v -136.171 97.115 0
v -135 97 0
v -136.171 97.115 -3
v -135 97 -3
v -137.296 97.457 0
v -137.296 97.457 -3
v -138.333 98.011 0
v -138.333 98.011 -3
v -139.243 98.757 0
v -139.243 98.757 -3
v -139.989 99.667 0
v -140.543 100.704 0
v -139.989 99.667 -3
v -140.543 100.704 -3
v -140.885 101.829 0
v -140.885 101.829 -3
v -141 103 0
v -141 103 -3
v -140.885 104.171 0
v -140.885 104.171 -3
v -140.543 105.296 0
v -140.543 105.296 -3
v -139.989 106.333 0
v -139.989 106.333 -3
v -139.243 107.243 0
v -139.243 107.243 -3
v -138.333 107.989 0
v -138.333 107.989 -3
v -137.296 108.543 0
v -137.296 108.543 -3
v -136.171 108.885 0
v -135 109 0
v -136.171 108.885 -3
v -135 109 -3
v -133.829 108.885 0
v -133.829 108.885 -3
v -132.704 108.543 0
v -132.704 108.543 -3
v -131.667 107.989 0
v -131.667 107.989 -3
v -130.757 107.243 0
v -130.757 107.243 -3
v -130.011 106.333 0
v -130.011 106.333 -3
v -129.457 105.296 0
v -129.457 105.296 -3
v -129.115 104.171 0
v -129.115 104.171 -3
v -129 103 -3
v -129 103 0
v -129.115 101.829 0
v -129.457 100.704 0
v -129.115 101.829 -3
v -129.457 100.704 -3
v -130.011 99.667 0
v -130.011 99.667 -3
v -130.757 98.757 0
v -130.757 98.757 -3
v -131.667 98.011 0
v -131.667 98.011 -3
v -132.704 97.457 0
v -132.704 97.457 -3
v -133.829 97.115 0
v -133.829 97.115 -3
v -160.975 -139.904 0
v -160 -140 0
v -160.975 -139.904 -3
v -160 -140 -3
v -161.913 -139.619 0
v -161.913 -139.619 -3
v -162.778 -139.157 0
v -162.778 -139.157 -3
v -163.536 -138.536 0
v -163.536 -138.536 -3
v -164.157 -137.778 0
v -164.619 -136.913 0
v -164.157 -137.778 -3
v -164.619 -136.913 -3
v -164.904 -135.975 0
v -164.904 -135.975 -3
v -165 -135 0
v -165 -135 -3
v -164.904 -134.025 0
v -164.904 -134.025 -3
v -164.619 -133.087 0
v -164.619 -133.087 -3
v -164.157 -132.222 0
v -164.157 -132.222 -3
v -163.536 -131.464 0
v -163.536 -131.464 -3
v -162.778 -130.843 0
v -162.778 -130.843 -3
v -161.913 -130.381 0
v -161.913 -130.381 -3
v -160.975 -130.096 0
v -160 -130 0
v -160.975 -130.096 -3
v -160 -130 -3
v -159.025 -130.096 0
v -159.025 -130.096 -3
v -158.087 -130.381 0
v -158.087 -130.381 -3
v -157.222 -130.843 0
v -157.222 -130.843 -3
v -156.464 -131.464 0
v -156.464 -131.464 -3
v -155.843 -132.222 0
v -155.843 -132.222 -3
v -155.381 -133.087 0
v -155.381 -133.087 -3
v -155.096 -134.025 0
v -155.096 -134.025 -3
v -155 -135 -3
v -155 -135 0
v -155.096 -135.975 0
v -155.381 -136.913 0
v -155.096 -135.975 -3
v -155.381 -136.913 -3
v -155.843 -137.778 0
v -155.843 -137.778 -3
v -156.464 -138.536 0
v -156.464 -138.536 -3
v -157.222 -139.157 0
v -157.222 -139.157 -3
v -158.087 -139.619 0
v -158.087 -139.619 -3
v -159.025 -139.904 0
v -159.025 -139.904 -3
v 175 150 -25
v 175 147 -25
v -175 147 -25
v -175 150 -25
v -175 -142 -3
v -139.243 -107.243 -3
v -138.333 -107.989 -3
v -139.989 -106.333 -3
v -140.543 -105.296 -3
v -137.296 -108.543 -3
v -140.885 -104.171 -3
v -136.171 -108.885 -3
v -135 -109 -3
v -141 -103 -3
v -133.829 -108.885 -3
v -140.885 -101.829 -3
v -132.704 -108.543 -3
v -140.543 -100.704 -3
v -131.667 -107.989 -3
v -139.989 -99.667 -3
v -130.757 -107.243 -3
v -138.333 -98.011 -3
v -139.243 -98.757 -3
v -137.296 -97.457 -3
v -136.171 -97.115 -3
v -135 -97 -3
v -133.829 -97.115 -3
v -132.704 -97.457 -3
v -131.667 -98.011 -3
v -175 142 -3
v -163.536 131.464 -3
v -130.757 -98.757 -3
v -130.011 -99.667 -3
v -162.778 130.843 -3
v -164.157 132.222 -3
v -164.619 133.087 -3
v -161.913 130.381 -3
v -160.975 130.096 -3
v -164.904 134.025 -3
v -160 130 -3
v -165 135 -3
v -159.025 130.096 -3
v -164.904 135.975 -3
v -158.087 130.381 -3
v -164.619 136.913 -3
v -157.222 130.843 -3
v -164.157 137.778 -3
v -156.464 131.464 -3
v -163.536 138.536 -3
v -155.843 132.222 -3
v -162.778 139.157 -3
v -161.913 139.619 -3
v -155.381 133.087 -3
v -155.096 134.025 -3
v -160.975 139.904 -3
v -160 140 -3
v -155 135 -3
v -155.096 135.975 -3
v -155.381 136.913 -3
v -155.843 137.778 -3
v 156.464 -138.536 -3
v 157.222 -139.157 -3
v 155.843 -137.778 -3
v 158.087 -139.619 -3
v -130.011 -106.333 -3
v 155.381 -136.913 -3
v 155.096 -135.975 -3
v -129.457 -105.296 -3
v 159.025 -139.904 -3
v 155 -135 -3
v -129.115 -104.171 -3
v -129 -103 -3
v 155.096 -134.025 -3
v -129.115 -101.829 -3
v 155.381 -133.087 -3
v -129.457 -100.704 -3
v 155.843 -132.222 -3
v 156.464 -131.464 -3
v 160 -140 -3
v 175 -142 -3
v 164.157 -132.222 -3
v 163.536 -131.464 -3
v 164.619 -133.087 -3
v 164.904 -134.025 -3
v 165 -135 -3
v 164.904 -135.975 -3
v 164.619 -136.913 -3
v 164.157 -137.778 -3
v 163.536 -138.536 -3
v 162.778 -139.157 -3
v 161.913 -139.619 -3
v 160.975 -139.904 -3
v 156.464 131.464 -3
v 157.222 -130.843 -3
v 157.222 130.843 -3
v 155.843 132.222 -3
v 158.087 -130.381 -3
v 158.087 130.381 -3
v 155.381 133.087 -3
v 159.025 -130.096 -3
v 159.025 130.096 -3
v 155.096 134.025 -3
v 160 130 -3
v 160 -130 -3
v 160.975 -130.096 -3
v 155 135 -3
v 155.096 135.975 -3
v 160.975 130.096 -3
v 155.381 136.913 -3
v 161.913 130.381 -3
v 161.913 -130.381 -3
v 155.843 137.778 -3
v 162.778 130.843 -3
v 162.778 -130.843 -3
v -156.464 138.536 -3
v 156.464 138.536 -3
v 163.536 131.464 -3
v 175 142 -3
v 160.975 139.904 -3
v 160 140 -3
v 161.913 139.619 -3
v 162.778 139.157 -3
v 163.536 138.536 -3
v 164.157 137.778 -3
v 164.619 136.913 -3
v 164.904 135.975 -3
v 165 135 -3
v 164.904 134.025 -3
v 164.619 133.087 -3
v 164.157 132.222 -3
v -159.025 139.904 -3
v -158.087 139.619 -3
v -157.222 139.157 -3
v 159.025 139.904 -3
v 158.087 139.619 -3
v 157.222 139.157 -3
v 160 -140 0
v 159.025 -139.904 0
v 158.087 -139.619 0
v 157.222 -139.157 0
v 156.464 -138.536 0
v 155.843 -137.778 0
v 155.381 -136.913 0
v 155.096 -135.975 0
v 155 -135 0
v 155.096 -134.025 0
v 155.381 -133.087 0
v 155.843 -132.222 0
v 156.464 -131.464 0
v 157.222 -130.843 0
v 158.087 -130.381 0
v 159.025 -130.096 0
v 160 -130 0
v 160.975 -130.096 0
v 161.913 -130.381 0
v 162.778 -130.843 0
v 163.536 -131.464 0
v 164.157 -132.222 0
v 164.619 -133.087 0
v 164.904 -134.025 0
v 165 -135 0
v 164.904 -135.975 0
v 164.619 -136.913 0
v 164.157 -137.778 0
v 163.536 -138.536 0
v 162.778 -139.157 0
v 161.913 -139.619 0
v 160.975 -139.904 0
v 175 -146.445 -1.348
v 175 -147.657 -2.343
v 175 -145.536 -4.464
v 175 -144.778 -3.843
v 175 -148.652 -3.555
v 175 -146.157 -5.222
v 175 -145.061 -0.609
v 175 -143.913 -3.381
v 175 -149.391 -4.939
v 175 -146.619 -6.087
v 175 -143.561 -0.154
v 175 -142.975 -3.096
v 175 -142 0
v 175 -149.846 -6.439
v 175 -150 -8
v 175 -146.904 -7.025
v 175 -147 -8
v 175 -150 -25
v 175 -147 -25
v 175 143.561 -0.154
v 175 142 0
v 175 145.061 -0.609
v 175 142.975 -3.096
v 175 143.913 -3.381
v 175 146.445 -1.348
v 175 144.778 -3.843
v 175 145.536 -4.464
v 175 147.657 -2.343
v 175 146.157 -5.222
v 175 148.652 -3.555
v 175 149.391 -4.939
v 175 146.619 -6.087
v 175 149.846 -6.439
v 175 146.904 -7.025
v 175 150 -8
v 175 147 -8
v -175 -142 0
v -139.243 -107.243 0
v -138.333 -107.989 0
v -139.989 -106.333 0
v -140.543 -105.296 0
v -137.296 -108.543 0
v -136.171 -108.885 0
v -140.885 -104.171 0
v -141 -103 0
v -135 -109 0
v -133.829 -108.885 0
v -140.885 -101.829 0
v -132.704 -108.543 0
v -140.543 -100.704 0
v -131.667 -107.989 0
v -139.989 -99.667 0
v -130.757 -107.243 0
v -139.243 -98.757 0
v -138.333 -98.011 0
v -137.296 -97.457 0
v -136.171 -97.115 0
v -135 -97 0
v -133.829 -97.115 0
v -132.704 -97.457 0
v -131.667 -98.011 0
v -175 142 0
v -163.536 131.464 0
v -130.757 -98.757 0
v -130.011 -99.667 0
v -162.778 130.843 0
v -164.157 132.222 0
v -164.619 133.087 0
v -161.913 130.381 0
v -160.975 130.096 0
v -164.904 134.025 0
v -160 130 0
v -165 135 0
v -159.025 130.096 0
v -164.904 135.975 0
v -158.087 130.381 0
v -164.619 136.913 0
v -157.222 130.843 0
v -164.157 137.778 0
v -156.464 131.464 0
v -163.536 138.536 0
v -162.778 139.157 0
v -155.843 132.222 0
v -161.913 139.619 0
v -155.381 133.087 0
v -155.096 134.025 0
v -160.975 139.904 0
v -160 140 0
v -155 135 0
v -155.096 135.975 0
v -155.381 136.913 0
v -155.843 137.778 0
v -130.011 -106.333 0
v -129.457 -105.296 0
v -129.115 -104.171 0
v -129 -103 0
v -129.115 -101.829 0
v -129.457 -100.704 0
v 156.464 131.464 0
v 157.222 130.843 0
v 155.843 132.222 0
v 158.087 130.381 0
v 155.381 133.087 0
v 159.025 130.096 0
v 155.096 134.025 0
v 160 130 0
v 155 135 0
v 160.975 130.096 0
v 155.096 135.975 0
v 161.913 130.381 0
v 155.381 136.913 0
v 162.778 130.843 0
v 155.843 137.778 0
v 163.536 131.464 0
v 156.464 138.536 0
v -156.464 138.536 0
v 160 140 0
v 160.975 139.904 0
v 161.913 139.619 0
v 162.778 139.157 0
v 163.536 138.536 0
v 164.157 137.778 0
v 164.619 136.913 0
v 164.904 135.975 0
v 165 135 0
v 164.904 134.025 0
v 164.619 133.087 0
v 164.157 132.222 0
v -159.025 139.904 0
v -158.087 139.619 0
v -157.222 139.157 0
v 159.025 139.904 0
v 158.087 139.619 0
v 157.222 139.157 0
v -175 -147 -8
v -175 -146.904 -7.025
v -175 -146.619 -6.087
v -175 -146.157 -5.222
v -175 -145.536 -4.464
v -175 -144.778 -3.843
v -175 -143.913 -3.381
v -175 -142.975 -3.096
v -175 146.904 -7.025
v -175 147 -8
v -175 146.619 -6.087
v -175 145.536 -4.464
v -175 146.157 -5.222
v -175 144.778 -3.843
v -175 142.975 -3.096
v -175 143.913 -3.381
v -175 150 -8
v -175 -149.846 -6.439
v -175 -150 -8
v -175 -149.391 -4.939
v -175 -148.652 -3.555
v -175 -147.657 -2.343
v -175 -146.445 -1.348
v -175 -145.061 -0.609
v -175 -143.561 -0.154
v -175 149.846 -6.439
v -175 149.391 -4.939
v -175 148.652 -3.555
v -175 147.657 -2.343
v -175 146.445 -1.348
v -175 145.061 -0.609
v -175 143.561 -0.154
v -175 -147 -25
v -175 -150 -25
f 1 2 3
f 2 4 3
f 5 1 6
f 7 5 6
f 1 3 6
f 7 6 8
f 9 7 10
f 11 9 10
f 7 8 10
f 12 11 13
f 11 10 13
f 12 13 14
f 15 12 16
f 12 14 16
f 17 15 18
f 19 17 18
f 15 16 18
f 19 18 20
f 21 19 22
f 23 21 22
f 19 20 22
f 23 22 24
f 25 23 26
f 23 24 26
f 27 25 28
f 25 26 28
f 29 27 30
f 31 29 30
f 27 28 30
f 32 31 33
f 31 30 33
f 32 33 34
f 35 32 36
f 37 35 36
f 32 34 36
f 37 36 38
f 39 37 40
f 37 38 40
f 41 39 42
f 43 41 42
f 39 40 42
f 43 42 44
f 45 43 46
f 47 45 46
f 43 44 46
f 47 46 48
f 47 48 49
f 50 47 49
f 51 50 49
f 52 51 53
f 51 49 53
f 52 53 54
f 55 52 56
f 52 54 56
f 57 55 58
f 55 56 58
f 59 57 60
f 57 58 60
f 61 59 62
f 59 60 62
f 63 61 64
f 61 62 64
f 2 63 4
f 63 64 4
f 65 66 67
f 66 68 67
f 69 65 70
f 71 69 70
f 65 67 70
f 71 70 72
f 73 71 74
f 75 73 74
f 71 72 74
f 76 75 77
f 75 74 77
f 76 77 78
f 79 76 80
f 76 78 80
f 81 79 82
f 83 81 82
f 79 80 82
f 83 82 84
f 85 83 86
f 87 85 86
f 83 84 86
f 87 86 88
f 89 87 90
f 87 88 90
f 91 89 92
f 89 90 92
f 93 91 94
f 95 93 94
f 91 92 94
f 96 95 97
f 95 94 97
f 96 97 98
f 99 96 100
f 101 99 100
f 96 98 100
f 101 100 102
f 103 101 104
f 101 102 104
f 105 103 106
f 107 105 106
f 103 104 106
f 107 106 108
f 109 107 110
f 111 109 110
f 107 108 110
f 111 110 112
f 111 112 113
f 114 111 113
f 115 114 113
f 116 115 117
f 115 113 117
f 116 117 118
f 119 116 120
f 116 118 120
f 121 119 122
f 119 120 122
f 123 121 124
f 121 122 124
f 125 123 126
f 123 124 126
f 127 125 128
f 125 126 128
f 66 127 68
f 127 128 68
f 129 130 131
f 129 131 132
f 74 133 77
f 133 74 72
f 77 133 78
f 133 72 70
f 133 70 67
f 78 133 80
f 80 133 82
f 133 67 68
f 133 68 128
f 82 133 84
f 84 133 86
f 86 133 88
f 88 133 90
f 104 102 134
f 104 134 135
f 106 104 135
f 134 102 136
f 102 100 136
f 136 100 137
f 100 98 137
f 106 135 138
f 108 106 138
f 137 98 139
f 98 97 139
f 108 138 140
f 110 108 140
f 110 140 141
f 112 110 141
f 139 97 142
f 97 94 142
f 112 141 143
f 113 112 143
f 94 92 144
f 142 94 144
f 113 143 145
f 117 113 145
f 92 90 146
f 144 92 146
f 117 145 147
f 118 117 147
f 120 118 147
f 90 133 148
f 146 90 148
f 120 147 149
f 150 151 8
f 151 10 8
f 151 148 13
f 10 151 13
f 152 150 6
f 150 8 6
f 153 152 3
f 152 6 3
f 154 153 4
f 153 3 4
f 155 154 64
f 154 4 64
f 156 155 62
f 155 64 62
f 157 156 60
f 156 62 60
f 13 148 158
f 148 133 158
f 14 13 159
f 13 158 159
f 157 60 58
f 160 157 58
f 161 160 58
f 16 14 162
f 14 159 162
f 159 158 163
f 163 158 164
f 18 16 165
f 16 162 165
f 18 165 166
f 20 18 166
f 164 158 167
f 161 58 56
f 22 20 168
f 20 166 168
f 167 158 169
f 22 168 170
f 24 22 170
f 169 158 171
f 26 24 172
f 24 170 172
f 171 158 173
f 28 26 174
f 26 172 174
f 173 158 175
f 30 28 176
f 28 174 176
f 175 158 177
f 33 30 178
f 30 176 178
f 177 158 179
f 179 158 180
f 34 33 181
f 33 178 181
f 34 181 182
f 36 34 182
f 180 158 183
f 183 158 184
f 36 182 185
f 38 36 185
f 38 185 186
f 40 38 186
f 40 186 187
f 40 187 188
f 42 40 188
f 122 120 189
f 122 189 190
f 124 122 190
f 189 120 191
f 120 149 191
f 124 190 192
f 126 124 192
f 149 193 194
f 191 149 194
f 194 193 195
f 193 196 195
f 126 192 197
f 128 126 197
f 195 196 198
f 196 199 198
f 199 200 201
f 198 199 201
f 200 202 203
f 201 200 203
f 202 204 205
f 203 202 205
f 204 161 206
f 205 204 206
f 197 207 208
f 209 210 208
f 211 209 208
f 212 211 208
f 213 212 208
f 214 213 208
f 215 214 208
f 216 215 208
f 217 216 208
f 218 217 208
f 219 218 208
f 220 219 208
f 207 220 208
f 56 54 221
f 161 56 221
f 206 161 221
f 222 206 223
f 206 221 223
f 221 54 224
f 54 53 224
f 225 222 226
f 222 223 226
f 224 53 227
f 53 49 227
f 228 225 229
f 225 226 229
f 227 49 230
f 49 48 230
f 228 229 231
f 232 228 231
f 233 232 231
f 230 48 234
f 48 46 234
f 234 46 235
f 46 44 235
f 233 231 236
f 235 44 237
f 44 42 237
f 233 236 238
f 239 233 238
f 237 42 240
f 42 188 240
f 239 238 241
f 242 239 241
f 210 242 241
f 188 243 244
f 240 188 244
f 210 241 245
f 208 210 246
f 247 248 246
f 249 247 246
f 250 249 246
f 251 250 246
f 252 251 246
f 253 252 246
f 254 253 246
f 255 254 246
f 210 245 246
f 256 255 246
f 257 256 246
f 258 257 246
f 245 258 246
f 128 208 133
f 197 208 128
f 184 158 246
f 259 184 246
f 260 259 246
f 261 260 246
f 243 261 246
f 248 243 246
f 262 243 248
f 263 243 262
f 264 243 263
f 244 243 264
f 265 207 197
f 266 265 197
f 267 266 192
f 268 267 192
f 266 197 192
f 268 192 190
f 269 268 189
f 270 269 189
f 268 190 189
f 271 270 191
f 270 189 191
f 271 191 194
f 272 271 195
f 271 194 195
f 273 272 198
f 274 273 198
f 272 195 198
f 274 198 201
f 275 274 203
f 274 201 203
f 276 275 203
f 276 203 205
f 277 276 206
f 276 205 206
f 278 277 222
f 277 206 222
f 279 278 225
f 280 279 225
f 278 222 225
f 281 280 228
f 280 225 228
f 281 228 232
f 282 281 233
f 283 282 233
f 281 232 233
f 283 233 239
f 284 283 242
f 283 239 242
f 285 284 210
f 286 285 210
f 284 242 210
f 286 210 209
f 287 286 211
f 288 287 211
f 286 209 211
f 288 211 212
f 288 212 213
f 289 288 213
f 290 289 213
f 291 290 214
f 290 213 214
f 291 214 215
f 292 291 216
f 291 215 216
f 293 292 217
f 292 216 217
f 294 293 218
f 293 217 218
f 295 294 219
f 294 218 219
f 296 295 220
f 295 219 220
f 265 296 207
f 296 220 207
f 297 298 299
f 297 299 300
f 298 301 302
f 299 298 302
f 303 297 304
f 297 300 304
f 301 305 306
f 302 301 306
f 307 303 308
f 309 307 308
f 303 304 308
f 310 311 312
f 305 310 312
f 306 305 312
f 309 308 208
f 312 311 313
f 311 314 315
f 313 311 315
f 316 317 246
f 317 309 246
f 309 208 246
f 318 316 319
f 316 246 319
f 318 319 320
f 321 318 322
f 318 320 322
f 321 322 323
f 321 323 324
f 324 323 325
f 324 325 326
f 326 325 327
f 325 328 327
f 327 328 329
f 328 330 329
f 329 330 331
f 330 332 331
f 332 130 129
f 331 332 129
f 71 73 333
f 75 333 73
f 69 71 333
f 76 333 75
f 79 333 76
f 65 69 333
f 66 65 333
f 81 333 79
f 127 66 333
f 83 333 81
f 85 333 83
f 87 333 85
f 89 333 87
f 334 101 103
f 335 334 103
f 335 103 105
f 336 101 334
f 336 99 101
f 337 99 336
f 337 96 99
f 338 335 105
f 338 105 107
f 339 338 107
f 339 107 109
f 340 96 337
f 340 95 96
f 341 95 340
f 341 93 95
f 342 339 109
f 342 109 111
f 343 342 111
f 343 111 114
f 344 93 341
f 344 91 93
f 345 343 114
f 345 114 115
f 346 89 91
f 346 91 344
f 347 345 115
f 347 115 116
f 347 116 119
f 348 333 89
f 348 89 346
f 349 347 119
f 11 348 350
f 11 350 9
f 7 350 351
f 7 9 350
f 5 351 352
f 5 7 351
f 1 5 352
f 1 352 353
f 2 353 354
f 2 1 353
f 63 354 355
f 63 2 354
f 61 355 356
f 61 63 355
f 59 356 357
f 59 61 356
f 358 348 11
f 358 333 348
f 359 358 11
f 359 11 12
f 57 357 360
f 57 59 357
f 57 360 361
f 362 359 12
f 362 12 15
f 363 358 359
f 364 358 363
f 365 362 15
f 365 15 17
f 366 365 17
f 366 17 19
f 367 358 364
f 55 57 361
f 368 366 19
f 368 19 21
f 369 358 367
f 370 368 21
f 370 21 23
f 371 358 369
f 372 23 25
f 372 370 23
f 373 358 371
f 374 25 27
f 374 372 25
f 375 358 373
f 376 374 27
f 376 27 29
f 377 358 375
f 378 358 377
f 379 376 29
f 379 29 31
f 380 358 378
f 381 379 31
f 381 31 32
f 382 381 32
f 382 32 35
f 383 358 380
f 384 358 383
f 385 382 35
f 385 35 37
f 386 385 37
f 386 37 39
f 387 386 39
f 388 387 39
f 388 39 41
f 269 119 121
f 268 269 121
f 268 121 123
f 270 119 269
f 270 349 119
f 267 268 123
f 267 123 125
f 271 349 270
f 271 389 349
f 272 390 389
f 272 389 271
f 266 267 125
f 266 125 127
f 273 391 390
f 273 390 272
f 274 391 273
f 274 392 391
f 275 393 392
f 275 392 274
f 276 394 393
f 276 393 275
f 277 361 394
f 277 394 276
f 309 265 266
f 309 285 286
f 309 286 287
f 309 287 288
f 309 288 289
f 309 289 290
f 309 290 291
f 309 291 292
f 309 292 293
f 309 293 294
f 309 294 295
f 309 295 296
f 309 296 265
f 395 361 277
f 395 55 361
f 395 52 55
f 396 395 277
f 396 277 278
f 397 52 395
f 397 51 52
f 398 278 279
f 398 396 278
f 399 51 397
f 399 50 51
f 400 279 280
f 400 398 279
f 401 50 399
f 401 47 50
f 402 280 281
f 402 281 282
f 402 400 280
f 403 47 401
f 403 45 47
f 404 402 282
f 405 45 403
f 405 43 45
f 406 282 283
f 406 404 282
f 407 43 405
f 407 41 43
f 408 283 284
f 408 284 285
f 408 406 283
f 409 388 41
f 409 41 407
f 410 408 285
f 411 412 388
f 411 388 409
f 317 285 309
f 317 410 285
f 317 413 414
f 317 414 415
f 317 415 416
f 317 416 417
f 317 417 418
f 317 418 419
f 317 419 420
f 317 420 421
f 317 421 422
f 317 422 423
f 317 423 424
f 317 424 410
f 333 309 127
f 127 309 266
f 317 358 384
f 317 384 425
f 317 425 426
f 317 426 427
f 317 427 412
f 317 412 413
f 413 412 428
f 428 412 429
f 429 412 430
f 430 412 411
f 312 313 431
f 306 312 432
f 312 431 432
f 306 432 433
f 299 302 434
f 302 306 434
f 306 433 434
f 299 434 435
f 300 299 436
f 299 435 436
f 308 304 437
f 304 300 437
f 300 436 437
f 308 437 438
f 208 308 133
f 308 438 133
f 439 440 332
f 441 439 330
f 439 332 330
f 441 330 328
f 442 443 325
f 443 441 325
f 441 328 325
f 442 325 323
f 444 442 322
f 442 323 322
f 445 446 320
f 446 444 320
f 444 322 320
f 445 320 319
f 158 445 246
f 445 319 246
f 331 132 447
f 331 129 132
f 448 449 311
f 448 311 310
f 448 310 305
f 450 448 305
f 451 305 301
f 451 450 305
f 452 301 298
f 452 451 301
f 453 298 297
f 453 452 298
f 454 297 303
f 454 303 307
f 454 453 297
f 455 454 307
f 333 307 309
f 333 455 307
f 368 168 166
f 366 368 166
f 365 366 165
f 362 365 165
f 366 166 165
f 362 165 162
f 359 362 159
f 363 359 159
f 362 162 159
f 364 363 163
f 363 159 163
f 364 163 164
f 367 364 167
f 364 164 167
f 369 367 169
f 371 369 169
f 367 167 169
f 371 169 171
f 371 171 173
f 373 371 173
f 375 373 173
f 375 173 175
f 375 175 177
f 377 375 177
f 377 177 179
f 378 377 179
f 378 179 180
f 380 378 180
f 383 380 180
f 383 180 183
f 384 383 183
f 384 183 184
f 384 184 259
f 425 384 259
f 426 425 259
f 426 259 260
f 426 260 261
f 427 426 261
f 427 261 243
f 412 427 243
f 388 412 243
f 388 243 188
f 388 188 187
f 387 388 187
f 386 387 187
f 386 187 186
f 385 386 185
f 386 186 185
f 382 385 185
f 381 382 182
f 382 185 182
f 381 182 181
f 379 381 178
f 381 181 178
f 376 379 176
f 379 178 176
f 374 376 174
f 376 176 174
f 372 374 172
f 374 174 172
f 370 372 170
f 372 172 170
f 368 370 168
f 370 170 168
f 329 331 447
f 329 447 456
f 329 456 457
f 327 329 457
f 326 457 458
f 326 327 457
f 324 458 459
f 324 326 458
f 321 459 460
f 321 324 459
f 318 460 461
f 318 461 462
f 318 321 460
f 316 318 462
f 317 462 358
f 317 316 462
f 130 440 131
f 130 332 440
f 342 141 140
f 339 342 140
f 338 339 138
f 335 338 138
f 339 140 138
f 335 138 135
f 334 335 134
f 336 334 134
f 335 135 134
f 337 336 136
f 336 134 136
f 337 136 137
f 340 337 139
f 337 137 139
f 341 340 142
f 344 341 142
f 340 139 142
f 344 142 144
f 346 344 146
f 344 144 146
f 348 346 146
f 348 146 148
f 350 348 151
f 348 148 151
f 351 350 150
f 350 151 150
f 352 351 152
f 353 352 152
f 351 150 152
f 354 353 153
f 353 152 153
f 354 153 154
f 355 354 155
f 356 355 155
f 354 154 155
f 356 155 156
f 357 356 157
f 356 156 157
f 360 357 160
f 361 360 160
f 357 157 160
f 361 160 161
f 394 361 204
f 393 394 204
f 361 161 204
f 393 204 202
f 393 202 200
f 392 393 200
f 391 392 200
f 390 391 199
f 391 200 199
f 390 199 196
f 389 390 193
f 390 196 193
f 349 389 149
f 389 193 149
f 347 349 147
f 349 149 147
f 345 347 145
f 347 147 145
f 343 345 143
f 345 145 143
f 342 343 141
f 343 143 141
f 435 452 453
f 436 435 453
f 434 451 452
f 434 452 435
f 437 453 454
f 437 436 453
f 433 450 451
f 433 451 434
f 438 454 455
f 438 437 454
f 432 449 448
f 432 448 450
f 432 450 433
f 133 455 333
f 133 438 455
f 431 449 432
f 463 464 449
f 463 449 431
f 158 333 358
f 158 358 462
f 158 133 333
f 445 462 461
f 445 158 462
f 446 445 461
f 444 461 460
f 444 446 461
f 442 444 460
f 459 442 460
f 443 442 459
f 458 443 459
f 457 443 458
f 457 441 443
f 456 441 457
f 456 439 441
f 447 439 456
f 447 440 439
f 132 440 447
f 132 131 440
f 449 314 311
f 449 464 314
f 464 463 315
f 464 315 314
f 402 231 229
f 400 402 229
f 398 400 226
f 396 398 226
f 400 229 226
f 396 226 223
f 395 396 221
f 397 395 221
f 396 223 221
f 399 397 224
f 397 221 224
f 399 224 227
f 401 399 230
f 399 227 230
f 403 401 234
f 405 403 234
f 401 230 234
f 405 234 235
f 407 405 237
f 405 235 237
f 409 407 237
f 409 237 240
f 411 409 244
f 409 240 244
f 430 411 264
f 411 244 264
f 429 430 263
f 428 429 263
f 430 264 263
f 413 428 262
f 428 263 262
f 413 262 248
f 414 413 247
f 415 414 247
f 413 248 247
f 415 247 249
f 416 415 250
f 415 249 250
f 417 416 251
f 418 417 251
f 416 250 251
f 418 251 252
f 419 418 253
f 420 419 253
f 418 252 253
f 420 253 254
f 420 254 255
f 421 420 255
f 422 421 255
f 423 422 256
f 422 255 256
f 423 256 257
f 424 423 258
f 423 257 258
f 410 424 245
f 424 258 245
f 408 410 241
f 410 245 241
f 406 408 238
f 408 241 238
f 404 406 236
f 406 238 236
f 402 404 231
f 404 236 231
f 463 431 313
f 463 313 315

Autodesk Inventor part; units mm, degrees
ref_plane "YZ Plane" through (0, 0, 0) normal (1, 0, 0) x (0, 1, 0)
ref_plane "XZ Plane" through (0, 0, 0) normal (0, 1, 0) x (-1, 0, 0)
ref_plane "XY Plane" through (0, 0, 0) normal (0, 0, 1) x (1, 0, 0)
sketch "Sketch1" plane through (0, 0, 0) normal (0, 0, 1) x (1, 0, 0)
  line L0 (-175, 150) -> (175, 150)
  line L1 (175, 150) -> (175, -150)
  line L2 (175, -150) -> (-175, -150)
  line L3 (-175, -150) -> (-175, 150)
  line L4 (-175, 150) -> (175, -150) construction
  point P0 (0, 0)
  point P1 (0, 0)
  dimension "d0" = 350
  dimension "d1" = 300
extrude "Plate1" add sketch "Sketch1" against normal blind 3
sketch "Sketch2" plane through (0, 0, 0) normal (0, 0, 1) x (1, 0, 0)
  line L0 (175, -150) -> (175, 150) projected
  line L1 (-135, 103) -> (-135, -103) construction
  line L2 (-175, 150) -> (-175, -150) projected
  point P0 (0, 0)
  point P1 (-135, 0)
  dimension "d23" = 40
  dimension "d24" = 206
hole "Hole4" at (-135, 103, 0) at (-135, -103, 0) direction (0, 0, -1) diameter 12 end through all
sketch "Sketch3" plane through (0, 0, 0) normal (0, 0, 1) x (1, 0, 0)
  line L0 (-160, 135) -> (160, 135) construction
  line L1 (160, 135) -> (160, -135) construction
  line L2 (160, -135) -> (-160, -135) construction
  line L3 (-160, -135) -> (-160, 135) construction
  line L4 (-160, 135) -> (160, -135) construction
  point P0 (0, 0)
  point P1 (0, 0)
  dimension "d14" = 270
  dimension "d15" = 320
hole "Hole2" at (-160, 135, 0) at (160, 135, 0) at (160, -135, 0) at (-160, -135, 0) direction (0, 0, -1) diameter 10 end through all
sketch "Sketch4" plane through (-175, -147, 0) normal (0, -1, 0) x (1, 0, 0)
  line L0 (350, 0) -> (0, 0)
  line L1 (0, 0) -> (0, -25)
  line L2 (0, -25) -> (350, -25)
  line L3 (350, -25) -> (350, 0)
edge flange "Flange1" height 25 angle 90 thickness 3 bend radius 5 thickness toward (0, -1, 0) relief round relief width 3 relief depth 1.5 corner gap 5 corner form 0 edges at (0, -150, -3) (0, 150, -3) wall of the first edge with corners at (175, -147, 0) (-175, -147, 0) (-175, -147, -25) (175, -147, -25)
bend "Bend1"
corner "Corner1"
equation "\"d2\" = Thickness"
equation "\"d39\" = BendReliefWidth"
equation "\"d40\" = BendReliefDepth"
equation "\"d41\" = MinimumRemnant"
equation "\"d42\" = TransitionRadius"
equation "\"d45\" = BendRadius"
equation "\"d46\" = CornerReliefSize"
equation "\"d47\" = GapSize"
equation "\"d48\" = JacobiRadiusSize"
equation "\"BendReliefWidth\" = Thickness"
equation "\"BendReliefDepth\" = 0.5 * Thickness"
equation "\"CornerReliefSize\" = 4 * Thickness"
equation "\"MinimumRemnant\" = 2 * Thickness"
equation "\"TransitionRadius\" = BendRadius"
equation "\"JacobiRadiusSize\" = BendRadius"
equation "\"GapSize\" = Thickness"
equation "\"Thickness\" = 3"
equation "\"BendRadius\" = 5"
properties part number "CP-190 plate" material "Stainless Steel"
